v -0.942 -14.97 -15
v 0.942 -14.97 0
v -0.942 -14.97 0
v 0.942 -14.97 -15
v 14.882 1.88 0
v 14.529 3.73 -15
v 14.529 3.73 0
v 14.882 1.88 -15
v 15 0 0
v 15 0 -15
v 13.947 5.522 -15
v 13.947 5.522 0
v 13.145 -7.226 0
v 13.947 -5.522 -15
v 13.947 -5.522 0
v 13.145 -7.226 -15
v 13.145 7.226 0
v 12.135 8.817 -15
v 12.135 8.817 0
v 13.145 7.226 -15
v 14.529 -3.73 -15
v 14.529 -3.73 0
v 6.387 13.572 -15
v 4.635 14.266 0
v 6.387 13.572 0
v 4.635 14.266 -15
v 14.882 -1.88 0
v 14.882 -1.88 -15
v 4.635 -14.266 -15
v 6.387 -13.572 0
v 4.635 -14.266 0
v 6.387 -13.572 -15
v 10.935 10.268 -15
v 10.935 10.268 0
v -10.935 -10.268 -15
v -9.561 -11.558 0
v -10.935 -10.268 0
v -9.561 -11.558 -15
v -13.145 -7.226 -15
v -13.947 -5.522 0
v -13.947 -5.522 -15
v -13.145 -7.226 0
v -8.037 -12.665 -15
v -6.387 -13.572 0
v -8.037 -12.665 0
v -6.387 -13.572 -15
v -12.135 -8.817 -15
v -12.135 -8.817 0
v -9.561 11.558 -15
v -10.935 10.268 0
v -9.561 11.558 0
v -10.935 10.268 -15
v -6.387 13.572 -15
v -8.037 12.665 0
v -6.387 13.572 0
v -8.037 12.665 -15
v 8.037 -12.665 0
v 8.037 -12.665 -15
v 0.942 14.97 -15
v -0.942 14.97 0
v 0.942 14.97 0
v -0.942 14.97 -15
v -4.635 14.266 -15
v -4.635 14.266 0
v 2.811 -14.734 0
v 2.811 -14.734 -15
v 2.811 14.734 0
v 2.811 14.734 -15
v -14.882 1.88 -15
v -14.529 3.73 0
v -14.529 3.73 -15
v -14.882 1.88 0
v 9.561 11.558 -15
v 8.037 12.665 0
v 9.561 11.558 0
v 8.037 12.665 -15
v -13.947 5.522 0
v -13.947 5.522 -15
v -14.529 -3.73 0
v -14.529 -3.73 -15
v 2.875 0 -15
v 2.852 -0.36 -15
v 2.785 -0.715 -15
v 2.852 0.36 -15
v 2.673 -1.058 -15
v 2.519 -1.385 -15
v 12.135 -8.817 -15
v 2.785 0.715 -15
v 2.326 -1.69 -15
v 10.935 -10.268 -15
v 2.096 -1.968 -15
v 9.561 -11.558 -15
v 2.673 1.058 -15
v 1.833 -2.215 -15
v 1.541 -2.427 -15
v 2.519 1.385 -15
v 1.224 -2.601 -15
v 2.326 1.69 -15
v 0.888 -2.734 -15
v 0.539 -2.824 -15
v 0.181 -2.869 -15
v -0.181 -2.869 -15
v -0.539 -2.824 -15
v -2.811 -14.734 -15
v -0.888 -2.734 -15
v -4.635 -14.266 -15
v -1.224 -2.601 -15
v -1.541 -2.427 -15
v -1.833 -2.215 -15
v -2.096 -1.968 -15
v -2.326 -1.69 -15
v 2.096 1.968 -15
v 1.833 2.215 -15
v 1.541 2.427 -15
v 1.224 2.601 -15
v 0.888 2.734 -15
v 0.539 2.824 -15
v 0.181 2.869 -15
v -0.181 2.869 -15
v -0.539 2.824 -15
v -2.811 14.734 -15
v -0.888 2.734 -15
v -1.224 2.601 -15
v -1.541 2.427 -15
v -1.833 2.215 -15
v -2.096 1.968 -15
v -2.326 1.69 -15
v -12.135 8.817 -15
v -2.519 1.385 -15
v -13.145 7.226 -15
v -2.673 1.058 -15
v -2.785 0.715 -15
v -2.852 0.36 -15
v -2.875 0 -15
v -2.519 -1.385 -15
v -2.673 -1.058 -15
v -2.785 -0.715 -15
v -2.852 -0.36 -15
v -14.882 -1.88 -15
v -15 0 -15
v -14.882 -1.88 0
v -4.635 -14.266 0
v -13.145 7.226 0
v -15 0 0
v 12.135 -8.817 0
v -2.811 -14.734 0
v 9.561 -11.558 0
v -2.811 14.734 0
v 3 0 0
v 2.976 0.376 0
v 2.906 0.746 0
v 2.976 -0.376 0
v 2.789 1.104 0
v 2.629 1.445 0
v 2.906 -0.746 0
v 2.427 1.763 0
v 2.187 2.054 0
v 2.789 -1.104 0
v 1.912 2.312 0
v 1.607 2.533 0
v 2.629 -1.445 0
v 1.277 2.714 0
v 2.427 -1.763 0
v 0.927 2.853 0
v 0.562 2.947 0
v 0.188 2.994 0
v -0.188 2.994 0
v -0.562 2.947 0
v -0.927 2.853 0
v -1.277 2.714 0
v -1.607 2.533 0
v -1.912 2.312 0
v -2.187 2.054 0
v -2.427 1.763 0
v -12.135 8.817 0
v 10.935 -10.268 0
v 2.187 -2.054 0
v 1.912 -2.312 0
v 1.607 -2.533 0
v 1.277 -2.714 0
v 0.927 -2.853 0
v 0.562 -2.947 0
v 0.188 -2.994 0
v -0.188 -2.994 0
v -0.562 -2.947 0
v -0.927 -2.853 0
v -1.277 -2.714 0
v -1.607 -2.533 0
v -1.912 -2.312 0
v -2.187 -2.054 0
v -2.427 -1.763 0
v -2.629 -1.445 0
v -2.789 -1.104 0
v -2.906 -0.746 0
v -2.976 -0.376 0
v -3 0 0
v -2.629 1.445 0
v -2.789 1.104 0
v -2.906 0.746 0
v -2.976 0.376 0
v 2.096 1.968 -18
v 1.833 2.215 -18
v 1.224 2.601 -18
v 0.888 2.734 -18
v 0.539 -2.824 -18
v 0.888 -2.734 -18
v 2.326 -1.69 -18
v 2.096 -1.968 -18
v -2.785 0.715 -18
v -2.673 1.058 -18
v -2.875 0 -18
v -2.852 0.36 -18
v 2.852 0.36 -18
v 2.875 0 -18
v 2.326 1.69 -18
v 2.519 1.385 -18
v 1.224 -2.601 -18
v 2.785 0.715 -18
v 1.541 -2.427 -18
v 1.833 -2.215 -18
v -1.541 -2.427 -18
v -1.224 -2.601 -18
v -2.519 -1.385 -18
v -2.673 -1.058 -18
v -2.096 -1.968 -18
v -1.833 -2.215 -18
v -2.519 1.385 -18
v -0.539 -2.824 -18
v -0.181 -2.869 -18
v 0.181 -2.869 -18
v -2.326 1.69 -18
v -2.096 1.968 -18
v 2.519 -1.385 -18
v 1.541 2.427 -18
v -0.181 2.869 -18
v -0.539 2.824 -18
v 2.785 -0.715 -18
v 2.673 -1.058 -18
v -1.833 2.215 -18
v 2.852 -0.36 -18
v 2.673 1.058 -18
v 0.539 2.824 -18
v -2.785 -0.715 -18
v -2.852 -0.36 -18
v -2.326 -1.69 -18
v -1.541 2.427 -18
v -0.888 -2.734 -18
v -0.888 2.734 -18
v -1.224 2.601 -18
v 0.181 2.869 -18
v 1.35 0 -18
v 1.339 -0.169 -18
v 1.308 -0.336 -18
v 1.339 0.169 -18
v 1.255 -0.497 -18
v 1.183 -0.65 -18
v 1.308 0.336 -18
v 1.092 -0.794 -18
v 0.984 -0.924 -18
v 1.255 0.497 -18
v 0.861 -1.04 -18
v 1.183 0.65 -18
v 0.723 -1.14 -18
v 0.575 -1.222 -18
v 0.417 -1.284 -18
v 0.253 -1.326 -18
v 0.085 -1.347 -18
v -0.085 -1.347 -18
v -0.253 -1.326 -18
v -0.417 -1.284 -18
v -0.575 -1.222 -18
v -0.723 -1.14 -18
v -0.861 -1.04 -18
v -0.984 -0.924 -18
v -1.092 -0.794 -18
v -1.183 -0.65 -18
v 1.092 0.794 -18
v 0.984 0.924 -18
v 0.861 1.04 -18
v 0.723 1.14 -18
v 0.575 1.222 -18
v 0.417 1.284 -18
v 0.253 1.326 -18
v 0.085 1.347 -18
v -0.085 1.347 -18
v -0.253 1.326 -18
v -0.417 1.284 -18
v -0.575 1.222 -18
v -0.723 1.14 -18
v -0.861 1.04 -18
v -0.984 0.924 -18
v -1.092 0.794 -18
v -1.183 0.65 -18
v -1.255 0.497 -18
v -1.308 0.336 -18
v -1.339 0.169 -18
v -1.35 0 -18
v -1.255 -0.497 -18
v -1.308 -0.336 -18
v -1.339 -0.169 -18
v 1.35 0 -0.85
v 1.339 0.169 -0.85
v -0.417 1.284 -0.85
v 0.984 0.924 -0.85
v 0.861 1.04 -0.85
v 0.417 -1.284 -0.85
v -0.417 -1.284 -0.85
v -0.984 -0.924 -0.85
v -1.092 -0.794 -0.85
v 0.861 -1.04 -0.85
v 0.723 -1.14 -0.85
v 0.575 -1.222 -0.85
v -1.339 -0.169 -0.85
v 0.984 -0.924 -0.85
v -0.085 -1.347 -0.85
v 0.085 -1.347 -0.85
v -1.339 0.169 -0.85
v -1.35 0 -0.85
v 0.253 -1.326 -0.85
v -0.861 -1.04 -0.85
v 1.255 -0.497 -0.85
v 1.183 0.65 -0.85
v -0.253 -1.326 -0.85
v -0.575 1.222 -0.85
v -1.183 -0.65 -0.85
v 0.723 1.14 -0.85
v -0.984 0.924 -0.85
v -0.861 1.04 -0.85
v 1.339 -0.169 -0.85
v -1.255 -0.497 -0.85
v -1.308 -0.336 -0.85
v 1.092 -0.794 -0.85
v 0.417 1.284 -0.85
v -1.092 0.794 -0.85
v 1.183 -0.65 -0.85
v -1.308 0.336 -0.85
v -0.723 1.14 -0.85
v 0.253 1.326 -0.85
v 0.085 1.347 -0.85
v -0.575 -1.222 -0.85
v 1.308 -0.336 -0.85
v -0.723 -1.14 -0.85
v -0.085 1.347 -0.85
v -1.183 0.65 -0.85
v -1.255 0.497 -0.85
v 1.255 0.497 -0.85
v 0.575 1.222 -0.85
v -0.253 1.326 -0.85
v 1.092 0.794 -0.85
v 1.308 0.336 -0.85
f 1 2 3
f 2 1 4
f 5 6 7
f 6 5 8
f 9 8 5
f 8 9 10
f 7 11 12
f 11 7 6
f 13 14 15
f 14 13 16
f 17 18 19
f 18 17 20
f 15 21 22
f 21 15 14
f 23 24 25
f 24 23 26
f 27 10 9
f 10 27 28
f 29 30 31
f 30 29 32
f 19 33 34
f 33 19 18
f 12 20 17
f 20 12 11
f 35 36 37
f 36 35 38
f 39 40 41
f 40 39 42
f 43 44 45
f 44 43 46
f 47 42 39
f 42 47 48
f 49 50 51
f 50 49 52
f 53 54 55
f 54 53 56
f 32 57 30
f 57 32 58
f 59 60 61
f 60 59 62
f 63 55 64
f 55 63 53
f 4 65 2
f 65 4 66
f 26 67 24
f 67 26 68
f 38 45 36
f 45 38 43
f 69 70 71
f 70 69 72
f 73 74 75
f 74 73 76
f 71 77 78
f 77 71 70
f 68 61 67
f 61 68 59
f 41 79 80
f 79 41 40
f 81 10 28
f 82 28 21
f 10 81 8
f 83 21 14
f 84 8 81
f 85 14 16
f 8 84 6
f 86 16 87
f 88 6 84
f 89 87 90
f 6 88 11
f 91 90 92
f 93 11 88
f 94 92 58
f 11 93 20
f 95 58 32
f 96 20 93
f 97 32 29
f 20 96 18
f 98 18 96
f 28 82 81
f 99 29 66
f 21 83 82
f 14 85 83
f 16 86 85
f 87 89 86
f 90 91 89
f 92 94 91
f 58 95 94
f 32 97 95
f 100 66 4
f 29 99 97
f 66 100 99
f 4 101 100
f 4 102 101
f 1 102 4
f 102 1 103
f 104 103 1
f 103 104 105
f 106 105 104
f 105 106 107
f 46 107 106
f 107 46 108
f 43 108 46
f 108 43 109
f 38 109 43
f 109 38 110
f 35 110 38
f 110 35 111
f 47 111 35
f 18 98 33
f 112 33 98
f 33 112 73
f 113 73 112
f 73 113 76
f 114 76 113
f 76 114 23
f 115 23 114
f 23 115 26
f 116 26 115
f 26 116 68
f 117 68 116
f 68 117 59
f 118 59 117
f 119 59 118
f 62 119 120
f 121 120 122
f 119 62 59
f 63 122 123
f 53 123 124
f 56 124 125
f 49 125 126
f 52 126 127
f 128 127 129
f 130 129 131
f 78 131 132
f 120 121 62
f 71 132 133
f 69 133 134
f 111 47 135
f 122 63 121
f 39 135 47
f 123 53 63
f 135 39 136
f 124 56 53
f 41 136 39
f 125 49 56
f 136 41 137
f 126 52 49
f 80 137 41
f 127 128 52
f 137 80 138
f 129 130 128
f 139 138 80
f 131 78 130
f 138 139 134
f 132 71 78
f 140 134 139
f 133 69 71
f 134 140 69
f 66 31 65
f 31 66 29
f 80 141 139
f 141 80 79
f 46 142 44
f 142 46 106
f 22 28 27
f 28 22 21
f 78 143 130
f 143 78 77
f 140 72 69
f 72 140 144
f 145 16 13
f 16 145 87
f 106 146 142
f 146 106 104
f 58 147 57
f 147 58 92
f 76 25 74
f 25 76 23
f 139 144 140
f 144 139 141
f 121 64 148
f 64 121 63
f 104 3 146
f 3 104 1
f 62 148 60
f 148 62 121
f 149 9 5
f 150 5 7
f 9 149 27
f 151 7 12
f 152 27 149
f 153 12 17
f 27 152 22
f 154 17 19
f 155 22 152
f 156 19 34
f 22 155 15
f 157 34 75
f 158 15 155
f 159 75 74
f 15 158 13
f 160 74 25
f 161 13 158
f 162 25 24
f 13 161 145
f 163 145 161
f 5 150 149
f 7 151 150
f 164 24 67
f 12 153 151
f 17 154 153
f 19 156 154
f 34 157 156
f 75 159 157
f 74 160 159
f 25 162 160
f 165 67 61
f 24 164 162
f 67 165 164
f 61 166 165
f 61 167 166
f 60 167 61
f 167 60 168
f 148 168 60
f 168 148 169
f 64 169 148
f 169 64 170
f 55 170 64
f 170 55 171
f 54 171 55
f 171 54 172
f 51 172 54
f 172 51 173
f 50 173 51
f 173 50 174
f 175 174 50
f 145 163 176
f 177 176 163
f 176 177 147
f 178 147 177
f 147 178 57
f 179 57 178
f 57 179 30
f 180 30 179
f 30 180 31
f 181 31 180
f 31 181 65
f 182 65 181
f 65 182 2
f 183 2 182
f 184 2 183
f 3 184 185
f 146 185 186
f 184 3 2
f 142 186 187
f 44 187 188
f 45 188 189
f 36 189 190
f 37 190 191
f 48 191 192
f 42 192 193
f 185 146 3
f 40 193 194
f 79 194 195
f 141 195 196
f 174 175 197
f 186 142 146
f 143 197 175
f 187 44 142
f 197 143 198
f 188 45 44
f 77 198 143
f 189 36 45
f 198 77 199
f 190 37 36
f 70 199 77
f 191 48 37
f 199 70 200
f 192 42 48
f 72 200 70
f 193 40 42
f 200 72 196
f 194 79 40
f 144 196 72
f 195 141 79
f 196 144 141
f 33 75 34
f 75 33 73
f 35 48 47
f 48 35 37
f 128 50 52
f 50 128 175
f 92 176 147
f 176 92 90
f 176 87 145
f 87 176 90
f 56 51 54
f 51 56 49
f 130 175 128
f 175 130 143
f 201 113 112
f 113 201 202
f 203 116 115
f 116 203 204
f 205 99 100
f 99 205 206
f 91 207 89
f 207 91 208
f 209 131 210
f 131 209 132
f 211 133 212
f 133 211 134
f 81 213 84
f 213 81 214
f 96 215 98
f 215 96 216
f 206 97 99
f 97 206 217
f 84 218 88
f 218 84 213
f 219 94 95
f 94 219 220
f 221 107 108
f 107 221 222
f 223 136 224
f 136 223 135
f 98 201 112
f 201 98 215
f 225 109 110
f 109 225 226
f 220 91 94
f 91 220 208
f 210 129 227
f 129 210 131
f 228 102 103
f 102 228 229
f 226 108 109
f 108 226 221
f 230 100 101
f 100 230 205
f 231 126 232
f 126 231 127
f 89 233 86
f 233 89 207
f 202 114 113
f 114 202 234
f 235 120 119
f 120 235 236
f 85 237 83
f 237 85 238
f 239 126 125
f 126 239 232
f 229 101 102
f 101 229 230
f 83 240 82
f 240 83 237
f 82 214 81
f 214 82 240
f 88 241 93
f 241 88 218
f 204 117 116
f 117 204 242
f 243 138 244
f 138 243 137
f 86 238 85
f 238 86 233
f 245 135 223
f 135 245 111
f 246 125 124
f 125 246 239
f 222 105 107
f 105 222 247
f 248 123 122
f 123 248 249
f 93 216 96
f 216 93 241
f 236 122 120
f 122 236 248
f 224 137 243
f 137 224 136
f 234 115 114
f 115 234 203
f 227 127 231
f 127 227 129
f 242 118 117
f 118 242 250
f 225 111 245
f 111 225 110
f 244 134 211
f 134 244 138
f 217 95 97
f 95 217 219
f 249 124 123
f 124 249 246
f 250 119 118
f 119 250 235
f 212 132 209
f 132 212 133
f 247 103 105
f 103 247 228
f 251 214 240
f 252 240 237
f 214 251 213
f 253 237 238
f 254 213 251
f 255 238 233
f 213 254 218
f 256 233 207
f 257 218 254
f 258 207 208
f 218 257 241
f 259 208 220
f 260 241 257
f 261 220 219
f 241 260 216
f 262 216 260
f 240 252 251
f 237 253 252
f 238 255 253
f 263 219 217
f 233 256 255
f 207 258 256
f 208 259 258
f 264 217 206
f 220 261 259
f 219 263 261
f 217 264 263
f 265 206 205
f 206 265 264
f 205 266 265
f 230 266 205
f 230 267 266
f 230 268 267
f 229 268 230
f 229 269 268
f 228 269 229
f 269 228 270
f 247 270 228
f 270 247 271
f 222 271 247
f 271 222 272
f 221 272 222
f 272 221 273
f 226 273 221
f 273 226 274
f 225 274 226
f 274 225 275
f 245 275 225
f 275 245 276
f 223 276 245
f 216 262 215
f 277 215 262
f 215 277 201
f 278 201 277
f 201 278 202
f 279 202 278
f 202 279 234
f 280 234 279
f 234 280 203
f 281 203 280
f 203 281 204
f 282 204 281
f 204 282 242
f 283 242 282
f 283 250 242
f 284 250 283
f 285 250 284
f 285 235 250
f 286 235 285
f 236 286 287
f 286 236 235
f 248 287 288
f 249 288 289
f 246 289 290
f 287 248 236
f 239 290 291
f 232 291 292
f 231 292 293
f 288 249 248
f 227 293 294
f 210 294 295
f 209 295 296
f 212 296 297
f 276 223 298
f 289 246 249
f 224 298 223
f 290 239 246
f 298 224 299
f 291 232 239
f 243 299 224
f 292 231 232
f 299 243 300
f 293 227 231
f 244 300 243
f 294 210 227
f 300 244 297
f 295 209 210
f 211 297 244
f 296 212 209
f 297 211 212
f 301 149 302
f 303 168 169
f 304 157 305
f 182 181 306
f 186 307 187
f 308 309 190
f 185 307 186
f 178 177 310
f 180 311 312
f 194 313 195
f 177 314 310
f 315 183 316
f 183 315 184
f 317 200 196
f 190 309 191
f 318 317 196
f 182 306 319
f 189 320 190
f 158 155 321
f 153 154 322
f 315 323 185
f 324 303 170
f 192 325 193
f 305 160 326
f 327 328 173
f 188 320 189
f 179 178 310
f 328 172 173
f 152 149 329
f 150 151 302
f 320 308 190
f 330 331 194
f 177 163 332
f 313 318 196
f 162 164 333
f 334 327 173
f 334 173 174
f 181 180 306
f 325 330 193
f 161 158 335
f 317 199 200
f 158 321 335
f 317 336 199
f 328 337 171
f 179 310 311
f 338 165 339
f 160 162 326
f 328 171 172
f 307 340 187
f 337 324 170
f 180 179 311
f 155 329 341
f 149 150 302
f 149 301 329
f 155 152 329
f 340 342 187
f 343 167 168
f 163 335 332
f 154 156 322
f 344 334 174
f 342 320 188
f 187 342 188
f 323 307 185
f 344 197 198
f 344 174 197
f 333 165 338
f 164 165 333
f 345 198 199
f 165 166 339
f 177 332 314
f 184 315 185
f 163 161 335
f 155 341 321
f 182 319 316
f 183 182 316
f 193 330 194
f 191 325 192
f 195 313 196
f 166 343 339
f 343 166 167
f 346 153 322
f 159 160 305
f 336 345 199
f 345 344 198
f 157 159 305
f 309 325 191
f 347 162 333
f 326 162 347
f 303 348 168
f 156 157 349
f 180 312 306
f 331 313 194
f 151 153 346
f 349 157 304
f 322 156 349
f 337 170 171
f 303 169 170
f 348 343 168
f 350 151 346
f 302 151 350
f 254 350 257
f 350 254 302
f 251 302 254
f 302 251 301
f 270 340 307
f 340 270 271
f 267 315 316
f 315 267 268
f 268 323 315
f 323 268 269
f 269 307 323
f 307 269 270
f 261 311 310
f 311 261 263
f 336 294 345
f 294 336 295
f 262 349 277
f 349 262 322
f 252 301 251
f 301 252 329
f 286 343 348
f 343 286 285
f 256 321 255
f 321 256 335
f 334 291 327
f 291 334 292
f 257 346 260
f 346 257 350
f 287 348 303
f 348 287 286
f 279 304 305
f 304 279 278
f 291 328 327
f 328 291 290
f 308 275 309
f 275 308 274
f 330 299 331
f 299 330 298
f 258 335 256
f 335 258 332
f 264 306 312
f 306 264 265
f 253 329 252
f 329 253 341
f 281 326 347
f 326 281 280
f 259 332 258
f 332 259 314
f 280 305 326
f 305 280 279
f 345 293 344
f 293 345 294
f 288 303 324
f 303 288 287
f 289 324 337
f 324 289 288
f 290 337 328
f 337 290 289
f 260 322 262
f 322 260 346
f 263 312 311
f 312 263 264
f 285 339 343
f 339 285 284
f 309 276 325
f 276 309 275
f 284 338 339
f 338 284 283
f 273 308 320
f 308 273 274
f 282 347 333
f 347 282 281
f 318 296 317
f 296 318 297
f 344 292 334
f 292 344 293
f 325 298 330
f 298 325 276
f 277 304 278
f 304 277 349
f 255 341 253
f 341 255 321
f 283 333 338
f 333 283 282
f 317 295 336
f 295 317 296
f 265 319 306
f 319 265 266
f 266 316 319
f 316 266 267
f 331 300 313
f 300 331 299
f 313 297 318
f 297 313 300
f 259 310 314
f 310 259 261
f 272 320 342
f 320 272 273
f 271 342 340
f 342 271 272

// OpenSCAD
$fn = 50;


difference() {
	union() {
		translate(v = [0, 0, -15.0000000000]) {
			cylinder(h = 15, r = 15.0000000000);
		}
		#translate(v = [0, 0, -18.0000000000]) {
			cylinder(h = 18, r = 2.8750000000);
		}
	}
	union() {
		translate(v = [0, 0, 0]) {
			rotate(a = [0, 0, 0]) {
				difference() {
					union() {
						translate(v = [0, 0, -18.0000000000]) {
							cylinder(h = 18, r = 1.0000000000);
						}
						translate(v = [0, 0, -0.8500000000]) {
							cylinder(h = 0.8500000000, r1 = 1.3500000000, r2 = 3.0000000000);
						}
						translate(v = [0, 0, -18.0000000000]) {
							cylinder(h = 18, r = 1.3500000000);
						}
						translate(v = [0, 0, -18.0000000000]) {
							cylinder(h = 18, r = 1.0000000000);
						}
					}
					union();
				}
			}
		}
	}
}
